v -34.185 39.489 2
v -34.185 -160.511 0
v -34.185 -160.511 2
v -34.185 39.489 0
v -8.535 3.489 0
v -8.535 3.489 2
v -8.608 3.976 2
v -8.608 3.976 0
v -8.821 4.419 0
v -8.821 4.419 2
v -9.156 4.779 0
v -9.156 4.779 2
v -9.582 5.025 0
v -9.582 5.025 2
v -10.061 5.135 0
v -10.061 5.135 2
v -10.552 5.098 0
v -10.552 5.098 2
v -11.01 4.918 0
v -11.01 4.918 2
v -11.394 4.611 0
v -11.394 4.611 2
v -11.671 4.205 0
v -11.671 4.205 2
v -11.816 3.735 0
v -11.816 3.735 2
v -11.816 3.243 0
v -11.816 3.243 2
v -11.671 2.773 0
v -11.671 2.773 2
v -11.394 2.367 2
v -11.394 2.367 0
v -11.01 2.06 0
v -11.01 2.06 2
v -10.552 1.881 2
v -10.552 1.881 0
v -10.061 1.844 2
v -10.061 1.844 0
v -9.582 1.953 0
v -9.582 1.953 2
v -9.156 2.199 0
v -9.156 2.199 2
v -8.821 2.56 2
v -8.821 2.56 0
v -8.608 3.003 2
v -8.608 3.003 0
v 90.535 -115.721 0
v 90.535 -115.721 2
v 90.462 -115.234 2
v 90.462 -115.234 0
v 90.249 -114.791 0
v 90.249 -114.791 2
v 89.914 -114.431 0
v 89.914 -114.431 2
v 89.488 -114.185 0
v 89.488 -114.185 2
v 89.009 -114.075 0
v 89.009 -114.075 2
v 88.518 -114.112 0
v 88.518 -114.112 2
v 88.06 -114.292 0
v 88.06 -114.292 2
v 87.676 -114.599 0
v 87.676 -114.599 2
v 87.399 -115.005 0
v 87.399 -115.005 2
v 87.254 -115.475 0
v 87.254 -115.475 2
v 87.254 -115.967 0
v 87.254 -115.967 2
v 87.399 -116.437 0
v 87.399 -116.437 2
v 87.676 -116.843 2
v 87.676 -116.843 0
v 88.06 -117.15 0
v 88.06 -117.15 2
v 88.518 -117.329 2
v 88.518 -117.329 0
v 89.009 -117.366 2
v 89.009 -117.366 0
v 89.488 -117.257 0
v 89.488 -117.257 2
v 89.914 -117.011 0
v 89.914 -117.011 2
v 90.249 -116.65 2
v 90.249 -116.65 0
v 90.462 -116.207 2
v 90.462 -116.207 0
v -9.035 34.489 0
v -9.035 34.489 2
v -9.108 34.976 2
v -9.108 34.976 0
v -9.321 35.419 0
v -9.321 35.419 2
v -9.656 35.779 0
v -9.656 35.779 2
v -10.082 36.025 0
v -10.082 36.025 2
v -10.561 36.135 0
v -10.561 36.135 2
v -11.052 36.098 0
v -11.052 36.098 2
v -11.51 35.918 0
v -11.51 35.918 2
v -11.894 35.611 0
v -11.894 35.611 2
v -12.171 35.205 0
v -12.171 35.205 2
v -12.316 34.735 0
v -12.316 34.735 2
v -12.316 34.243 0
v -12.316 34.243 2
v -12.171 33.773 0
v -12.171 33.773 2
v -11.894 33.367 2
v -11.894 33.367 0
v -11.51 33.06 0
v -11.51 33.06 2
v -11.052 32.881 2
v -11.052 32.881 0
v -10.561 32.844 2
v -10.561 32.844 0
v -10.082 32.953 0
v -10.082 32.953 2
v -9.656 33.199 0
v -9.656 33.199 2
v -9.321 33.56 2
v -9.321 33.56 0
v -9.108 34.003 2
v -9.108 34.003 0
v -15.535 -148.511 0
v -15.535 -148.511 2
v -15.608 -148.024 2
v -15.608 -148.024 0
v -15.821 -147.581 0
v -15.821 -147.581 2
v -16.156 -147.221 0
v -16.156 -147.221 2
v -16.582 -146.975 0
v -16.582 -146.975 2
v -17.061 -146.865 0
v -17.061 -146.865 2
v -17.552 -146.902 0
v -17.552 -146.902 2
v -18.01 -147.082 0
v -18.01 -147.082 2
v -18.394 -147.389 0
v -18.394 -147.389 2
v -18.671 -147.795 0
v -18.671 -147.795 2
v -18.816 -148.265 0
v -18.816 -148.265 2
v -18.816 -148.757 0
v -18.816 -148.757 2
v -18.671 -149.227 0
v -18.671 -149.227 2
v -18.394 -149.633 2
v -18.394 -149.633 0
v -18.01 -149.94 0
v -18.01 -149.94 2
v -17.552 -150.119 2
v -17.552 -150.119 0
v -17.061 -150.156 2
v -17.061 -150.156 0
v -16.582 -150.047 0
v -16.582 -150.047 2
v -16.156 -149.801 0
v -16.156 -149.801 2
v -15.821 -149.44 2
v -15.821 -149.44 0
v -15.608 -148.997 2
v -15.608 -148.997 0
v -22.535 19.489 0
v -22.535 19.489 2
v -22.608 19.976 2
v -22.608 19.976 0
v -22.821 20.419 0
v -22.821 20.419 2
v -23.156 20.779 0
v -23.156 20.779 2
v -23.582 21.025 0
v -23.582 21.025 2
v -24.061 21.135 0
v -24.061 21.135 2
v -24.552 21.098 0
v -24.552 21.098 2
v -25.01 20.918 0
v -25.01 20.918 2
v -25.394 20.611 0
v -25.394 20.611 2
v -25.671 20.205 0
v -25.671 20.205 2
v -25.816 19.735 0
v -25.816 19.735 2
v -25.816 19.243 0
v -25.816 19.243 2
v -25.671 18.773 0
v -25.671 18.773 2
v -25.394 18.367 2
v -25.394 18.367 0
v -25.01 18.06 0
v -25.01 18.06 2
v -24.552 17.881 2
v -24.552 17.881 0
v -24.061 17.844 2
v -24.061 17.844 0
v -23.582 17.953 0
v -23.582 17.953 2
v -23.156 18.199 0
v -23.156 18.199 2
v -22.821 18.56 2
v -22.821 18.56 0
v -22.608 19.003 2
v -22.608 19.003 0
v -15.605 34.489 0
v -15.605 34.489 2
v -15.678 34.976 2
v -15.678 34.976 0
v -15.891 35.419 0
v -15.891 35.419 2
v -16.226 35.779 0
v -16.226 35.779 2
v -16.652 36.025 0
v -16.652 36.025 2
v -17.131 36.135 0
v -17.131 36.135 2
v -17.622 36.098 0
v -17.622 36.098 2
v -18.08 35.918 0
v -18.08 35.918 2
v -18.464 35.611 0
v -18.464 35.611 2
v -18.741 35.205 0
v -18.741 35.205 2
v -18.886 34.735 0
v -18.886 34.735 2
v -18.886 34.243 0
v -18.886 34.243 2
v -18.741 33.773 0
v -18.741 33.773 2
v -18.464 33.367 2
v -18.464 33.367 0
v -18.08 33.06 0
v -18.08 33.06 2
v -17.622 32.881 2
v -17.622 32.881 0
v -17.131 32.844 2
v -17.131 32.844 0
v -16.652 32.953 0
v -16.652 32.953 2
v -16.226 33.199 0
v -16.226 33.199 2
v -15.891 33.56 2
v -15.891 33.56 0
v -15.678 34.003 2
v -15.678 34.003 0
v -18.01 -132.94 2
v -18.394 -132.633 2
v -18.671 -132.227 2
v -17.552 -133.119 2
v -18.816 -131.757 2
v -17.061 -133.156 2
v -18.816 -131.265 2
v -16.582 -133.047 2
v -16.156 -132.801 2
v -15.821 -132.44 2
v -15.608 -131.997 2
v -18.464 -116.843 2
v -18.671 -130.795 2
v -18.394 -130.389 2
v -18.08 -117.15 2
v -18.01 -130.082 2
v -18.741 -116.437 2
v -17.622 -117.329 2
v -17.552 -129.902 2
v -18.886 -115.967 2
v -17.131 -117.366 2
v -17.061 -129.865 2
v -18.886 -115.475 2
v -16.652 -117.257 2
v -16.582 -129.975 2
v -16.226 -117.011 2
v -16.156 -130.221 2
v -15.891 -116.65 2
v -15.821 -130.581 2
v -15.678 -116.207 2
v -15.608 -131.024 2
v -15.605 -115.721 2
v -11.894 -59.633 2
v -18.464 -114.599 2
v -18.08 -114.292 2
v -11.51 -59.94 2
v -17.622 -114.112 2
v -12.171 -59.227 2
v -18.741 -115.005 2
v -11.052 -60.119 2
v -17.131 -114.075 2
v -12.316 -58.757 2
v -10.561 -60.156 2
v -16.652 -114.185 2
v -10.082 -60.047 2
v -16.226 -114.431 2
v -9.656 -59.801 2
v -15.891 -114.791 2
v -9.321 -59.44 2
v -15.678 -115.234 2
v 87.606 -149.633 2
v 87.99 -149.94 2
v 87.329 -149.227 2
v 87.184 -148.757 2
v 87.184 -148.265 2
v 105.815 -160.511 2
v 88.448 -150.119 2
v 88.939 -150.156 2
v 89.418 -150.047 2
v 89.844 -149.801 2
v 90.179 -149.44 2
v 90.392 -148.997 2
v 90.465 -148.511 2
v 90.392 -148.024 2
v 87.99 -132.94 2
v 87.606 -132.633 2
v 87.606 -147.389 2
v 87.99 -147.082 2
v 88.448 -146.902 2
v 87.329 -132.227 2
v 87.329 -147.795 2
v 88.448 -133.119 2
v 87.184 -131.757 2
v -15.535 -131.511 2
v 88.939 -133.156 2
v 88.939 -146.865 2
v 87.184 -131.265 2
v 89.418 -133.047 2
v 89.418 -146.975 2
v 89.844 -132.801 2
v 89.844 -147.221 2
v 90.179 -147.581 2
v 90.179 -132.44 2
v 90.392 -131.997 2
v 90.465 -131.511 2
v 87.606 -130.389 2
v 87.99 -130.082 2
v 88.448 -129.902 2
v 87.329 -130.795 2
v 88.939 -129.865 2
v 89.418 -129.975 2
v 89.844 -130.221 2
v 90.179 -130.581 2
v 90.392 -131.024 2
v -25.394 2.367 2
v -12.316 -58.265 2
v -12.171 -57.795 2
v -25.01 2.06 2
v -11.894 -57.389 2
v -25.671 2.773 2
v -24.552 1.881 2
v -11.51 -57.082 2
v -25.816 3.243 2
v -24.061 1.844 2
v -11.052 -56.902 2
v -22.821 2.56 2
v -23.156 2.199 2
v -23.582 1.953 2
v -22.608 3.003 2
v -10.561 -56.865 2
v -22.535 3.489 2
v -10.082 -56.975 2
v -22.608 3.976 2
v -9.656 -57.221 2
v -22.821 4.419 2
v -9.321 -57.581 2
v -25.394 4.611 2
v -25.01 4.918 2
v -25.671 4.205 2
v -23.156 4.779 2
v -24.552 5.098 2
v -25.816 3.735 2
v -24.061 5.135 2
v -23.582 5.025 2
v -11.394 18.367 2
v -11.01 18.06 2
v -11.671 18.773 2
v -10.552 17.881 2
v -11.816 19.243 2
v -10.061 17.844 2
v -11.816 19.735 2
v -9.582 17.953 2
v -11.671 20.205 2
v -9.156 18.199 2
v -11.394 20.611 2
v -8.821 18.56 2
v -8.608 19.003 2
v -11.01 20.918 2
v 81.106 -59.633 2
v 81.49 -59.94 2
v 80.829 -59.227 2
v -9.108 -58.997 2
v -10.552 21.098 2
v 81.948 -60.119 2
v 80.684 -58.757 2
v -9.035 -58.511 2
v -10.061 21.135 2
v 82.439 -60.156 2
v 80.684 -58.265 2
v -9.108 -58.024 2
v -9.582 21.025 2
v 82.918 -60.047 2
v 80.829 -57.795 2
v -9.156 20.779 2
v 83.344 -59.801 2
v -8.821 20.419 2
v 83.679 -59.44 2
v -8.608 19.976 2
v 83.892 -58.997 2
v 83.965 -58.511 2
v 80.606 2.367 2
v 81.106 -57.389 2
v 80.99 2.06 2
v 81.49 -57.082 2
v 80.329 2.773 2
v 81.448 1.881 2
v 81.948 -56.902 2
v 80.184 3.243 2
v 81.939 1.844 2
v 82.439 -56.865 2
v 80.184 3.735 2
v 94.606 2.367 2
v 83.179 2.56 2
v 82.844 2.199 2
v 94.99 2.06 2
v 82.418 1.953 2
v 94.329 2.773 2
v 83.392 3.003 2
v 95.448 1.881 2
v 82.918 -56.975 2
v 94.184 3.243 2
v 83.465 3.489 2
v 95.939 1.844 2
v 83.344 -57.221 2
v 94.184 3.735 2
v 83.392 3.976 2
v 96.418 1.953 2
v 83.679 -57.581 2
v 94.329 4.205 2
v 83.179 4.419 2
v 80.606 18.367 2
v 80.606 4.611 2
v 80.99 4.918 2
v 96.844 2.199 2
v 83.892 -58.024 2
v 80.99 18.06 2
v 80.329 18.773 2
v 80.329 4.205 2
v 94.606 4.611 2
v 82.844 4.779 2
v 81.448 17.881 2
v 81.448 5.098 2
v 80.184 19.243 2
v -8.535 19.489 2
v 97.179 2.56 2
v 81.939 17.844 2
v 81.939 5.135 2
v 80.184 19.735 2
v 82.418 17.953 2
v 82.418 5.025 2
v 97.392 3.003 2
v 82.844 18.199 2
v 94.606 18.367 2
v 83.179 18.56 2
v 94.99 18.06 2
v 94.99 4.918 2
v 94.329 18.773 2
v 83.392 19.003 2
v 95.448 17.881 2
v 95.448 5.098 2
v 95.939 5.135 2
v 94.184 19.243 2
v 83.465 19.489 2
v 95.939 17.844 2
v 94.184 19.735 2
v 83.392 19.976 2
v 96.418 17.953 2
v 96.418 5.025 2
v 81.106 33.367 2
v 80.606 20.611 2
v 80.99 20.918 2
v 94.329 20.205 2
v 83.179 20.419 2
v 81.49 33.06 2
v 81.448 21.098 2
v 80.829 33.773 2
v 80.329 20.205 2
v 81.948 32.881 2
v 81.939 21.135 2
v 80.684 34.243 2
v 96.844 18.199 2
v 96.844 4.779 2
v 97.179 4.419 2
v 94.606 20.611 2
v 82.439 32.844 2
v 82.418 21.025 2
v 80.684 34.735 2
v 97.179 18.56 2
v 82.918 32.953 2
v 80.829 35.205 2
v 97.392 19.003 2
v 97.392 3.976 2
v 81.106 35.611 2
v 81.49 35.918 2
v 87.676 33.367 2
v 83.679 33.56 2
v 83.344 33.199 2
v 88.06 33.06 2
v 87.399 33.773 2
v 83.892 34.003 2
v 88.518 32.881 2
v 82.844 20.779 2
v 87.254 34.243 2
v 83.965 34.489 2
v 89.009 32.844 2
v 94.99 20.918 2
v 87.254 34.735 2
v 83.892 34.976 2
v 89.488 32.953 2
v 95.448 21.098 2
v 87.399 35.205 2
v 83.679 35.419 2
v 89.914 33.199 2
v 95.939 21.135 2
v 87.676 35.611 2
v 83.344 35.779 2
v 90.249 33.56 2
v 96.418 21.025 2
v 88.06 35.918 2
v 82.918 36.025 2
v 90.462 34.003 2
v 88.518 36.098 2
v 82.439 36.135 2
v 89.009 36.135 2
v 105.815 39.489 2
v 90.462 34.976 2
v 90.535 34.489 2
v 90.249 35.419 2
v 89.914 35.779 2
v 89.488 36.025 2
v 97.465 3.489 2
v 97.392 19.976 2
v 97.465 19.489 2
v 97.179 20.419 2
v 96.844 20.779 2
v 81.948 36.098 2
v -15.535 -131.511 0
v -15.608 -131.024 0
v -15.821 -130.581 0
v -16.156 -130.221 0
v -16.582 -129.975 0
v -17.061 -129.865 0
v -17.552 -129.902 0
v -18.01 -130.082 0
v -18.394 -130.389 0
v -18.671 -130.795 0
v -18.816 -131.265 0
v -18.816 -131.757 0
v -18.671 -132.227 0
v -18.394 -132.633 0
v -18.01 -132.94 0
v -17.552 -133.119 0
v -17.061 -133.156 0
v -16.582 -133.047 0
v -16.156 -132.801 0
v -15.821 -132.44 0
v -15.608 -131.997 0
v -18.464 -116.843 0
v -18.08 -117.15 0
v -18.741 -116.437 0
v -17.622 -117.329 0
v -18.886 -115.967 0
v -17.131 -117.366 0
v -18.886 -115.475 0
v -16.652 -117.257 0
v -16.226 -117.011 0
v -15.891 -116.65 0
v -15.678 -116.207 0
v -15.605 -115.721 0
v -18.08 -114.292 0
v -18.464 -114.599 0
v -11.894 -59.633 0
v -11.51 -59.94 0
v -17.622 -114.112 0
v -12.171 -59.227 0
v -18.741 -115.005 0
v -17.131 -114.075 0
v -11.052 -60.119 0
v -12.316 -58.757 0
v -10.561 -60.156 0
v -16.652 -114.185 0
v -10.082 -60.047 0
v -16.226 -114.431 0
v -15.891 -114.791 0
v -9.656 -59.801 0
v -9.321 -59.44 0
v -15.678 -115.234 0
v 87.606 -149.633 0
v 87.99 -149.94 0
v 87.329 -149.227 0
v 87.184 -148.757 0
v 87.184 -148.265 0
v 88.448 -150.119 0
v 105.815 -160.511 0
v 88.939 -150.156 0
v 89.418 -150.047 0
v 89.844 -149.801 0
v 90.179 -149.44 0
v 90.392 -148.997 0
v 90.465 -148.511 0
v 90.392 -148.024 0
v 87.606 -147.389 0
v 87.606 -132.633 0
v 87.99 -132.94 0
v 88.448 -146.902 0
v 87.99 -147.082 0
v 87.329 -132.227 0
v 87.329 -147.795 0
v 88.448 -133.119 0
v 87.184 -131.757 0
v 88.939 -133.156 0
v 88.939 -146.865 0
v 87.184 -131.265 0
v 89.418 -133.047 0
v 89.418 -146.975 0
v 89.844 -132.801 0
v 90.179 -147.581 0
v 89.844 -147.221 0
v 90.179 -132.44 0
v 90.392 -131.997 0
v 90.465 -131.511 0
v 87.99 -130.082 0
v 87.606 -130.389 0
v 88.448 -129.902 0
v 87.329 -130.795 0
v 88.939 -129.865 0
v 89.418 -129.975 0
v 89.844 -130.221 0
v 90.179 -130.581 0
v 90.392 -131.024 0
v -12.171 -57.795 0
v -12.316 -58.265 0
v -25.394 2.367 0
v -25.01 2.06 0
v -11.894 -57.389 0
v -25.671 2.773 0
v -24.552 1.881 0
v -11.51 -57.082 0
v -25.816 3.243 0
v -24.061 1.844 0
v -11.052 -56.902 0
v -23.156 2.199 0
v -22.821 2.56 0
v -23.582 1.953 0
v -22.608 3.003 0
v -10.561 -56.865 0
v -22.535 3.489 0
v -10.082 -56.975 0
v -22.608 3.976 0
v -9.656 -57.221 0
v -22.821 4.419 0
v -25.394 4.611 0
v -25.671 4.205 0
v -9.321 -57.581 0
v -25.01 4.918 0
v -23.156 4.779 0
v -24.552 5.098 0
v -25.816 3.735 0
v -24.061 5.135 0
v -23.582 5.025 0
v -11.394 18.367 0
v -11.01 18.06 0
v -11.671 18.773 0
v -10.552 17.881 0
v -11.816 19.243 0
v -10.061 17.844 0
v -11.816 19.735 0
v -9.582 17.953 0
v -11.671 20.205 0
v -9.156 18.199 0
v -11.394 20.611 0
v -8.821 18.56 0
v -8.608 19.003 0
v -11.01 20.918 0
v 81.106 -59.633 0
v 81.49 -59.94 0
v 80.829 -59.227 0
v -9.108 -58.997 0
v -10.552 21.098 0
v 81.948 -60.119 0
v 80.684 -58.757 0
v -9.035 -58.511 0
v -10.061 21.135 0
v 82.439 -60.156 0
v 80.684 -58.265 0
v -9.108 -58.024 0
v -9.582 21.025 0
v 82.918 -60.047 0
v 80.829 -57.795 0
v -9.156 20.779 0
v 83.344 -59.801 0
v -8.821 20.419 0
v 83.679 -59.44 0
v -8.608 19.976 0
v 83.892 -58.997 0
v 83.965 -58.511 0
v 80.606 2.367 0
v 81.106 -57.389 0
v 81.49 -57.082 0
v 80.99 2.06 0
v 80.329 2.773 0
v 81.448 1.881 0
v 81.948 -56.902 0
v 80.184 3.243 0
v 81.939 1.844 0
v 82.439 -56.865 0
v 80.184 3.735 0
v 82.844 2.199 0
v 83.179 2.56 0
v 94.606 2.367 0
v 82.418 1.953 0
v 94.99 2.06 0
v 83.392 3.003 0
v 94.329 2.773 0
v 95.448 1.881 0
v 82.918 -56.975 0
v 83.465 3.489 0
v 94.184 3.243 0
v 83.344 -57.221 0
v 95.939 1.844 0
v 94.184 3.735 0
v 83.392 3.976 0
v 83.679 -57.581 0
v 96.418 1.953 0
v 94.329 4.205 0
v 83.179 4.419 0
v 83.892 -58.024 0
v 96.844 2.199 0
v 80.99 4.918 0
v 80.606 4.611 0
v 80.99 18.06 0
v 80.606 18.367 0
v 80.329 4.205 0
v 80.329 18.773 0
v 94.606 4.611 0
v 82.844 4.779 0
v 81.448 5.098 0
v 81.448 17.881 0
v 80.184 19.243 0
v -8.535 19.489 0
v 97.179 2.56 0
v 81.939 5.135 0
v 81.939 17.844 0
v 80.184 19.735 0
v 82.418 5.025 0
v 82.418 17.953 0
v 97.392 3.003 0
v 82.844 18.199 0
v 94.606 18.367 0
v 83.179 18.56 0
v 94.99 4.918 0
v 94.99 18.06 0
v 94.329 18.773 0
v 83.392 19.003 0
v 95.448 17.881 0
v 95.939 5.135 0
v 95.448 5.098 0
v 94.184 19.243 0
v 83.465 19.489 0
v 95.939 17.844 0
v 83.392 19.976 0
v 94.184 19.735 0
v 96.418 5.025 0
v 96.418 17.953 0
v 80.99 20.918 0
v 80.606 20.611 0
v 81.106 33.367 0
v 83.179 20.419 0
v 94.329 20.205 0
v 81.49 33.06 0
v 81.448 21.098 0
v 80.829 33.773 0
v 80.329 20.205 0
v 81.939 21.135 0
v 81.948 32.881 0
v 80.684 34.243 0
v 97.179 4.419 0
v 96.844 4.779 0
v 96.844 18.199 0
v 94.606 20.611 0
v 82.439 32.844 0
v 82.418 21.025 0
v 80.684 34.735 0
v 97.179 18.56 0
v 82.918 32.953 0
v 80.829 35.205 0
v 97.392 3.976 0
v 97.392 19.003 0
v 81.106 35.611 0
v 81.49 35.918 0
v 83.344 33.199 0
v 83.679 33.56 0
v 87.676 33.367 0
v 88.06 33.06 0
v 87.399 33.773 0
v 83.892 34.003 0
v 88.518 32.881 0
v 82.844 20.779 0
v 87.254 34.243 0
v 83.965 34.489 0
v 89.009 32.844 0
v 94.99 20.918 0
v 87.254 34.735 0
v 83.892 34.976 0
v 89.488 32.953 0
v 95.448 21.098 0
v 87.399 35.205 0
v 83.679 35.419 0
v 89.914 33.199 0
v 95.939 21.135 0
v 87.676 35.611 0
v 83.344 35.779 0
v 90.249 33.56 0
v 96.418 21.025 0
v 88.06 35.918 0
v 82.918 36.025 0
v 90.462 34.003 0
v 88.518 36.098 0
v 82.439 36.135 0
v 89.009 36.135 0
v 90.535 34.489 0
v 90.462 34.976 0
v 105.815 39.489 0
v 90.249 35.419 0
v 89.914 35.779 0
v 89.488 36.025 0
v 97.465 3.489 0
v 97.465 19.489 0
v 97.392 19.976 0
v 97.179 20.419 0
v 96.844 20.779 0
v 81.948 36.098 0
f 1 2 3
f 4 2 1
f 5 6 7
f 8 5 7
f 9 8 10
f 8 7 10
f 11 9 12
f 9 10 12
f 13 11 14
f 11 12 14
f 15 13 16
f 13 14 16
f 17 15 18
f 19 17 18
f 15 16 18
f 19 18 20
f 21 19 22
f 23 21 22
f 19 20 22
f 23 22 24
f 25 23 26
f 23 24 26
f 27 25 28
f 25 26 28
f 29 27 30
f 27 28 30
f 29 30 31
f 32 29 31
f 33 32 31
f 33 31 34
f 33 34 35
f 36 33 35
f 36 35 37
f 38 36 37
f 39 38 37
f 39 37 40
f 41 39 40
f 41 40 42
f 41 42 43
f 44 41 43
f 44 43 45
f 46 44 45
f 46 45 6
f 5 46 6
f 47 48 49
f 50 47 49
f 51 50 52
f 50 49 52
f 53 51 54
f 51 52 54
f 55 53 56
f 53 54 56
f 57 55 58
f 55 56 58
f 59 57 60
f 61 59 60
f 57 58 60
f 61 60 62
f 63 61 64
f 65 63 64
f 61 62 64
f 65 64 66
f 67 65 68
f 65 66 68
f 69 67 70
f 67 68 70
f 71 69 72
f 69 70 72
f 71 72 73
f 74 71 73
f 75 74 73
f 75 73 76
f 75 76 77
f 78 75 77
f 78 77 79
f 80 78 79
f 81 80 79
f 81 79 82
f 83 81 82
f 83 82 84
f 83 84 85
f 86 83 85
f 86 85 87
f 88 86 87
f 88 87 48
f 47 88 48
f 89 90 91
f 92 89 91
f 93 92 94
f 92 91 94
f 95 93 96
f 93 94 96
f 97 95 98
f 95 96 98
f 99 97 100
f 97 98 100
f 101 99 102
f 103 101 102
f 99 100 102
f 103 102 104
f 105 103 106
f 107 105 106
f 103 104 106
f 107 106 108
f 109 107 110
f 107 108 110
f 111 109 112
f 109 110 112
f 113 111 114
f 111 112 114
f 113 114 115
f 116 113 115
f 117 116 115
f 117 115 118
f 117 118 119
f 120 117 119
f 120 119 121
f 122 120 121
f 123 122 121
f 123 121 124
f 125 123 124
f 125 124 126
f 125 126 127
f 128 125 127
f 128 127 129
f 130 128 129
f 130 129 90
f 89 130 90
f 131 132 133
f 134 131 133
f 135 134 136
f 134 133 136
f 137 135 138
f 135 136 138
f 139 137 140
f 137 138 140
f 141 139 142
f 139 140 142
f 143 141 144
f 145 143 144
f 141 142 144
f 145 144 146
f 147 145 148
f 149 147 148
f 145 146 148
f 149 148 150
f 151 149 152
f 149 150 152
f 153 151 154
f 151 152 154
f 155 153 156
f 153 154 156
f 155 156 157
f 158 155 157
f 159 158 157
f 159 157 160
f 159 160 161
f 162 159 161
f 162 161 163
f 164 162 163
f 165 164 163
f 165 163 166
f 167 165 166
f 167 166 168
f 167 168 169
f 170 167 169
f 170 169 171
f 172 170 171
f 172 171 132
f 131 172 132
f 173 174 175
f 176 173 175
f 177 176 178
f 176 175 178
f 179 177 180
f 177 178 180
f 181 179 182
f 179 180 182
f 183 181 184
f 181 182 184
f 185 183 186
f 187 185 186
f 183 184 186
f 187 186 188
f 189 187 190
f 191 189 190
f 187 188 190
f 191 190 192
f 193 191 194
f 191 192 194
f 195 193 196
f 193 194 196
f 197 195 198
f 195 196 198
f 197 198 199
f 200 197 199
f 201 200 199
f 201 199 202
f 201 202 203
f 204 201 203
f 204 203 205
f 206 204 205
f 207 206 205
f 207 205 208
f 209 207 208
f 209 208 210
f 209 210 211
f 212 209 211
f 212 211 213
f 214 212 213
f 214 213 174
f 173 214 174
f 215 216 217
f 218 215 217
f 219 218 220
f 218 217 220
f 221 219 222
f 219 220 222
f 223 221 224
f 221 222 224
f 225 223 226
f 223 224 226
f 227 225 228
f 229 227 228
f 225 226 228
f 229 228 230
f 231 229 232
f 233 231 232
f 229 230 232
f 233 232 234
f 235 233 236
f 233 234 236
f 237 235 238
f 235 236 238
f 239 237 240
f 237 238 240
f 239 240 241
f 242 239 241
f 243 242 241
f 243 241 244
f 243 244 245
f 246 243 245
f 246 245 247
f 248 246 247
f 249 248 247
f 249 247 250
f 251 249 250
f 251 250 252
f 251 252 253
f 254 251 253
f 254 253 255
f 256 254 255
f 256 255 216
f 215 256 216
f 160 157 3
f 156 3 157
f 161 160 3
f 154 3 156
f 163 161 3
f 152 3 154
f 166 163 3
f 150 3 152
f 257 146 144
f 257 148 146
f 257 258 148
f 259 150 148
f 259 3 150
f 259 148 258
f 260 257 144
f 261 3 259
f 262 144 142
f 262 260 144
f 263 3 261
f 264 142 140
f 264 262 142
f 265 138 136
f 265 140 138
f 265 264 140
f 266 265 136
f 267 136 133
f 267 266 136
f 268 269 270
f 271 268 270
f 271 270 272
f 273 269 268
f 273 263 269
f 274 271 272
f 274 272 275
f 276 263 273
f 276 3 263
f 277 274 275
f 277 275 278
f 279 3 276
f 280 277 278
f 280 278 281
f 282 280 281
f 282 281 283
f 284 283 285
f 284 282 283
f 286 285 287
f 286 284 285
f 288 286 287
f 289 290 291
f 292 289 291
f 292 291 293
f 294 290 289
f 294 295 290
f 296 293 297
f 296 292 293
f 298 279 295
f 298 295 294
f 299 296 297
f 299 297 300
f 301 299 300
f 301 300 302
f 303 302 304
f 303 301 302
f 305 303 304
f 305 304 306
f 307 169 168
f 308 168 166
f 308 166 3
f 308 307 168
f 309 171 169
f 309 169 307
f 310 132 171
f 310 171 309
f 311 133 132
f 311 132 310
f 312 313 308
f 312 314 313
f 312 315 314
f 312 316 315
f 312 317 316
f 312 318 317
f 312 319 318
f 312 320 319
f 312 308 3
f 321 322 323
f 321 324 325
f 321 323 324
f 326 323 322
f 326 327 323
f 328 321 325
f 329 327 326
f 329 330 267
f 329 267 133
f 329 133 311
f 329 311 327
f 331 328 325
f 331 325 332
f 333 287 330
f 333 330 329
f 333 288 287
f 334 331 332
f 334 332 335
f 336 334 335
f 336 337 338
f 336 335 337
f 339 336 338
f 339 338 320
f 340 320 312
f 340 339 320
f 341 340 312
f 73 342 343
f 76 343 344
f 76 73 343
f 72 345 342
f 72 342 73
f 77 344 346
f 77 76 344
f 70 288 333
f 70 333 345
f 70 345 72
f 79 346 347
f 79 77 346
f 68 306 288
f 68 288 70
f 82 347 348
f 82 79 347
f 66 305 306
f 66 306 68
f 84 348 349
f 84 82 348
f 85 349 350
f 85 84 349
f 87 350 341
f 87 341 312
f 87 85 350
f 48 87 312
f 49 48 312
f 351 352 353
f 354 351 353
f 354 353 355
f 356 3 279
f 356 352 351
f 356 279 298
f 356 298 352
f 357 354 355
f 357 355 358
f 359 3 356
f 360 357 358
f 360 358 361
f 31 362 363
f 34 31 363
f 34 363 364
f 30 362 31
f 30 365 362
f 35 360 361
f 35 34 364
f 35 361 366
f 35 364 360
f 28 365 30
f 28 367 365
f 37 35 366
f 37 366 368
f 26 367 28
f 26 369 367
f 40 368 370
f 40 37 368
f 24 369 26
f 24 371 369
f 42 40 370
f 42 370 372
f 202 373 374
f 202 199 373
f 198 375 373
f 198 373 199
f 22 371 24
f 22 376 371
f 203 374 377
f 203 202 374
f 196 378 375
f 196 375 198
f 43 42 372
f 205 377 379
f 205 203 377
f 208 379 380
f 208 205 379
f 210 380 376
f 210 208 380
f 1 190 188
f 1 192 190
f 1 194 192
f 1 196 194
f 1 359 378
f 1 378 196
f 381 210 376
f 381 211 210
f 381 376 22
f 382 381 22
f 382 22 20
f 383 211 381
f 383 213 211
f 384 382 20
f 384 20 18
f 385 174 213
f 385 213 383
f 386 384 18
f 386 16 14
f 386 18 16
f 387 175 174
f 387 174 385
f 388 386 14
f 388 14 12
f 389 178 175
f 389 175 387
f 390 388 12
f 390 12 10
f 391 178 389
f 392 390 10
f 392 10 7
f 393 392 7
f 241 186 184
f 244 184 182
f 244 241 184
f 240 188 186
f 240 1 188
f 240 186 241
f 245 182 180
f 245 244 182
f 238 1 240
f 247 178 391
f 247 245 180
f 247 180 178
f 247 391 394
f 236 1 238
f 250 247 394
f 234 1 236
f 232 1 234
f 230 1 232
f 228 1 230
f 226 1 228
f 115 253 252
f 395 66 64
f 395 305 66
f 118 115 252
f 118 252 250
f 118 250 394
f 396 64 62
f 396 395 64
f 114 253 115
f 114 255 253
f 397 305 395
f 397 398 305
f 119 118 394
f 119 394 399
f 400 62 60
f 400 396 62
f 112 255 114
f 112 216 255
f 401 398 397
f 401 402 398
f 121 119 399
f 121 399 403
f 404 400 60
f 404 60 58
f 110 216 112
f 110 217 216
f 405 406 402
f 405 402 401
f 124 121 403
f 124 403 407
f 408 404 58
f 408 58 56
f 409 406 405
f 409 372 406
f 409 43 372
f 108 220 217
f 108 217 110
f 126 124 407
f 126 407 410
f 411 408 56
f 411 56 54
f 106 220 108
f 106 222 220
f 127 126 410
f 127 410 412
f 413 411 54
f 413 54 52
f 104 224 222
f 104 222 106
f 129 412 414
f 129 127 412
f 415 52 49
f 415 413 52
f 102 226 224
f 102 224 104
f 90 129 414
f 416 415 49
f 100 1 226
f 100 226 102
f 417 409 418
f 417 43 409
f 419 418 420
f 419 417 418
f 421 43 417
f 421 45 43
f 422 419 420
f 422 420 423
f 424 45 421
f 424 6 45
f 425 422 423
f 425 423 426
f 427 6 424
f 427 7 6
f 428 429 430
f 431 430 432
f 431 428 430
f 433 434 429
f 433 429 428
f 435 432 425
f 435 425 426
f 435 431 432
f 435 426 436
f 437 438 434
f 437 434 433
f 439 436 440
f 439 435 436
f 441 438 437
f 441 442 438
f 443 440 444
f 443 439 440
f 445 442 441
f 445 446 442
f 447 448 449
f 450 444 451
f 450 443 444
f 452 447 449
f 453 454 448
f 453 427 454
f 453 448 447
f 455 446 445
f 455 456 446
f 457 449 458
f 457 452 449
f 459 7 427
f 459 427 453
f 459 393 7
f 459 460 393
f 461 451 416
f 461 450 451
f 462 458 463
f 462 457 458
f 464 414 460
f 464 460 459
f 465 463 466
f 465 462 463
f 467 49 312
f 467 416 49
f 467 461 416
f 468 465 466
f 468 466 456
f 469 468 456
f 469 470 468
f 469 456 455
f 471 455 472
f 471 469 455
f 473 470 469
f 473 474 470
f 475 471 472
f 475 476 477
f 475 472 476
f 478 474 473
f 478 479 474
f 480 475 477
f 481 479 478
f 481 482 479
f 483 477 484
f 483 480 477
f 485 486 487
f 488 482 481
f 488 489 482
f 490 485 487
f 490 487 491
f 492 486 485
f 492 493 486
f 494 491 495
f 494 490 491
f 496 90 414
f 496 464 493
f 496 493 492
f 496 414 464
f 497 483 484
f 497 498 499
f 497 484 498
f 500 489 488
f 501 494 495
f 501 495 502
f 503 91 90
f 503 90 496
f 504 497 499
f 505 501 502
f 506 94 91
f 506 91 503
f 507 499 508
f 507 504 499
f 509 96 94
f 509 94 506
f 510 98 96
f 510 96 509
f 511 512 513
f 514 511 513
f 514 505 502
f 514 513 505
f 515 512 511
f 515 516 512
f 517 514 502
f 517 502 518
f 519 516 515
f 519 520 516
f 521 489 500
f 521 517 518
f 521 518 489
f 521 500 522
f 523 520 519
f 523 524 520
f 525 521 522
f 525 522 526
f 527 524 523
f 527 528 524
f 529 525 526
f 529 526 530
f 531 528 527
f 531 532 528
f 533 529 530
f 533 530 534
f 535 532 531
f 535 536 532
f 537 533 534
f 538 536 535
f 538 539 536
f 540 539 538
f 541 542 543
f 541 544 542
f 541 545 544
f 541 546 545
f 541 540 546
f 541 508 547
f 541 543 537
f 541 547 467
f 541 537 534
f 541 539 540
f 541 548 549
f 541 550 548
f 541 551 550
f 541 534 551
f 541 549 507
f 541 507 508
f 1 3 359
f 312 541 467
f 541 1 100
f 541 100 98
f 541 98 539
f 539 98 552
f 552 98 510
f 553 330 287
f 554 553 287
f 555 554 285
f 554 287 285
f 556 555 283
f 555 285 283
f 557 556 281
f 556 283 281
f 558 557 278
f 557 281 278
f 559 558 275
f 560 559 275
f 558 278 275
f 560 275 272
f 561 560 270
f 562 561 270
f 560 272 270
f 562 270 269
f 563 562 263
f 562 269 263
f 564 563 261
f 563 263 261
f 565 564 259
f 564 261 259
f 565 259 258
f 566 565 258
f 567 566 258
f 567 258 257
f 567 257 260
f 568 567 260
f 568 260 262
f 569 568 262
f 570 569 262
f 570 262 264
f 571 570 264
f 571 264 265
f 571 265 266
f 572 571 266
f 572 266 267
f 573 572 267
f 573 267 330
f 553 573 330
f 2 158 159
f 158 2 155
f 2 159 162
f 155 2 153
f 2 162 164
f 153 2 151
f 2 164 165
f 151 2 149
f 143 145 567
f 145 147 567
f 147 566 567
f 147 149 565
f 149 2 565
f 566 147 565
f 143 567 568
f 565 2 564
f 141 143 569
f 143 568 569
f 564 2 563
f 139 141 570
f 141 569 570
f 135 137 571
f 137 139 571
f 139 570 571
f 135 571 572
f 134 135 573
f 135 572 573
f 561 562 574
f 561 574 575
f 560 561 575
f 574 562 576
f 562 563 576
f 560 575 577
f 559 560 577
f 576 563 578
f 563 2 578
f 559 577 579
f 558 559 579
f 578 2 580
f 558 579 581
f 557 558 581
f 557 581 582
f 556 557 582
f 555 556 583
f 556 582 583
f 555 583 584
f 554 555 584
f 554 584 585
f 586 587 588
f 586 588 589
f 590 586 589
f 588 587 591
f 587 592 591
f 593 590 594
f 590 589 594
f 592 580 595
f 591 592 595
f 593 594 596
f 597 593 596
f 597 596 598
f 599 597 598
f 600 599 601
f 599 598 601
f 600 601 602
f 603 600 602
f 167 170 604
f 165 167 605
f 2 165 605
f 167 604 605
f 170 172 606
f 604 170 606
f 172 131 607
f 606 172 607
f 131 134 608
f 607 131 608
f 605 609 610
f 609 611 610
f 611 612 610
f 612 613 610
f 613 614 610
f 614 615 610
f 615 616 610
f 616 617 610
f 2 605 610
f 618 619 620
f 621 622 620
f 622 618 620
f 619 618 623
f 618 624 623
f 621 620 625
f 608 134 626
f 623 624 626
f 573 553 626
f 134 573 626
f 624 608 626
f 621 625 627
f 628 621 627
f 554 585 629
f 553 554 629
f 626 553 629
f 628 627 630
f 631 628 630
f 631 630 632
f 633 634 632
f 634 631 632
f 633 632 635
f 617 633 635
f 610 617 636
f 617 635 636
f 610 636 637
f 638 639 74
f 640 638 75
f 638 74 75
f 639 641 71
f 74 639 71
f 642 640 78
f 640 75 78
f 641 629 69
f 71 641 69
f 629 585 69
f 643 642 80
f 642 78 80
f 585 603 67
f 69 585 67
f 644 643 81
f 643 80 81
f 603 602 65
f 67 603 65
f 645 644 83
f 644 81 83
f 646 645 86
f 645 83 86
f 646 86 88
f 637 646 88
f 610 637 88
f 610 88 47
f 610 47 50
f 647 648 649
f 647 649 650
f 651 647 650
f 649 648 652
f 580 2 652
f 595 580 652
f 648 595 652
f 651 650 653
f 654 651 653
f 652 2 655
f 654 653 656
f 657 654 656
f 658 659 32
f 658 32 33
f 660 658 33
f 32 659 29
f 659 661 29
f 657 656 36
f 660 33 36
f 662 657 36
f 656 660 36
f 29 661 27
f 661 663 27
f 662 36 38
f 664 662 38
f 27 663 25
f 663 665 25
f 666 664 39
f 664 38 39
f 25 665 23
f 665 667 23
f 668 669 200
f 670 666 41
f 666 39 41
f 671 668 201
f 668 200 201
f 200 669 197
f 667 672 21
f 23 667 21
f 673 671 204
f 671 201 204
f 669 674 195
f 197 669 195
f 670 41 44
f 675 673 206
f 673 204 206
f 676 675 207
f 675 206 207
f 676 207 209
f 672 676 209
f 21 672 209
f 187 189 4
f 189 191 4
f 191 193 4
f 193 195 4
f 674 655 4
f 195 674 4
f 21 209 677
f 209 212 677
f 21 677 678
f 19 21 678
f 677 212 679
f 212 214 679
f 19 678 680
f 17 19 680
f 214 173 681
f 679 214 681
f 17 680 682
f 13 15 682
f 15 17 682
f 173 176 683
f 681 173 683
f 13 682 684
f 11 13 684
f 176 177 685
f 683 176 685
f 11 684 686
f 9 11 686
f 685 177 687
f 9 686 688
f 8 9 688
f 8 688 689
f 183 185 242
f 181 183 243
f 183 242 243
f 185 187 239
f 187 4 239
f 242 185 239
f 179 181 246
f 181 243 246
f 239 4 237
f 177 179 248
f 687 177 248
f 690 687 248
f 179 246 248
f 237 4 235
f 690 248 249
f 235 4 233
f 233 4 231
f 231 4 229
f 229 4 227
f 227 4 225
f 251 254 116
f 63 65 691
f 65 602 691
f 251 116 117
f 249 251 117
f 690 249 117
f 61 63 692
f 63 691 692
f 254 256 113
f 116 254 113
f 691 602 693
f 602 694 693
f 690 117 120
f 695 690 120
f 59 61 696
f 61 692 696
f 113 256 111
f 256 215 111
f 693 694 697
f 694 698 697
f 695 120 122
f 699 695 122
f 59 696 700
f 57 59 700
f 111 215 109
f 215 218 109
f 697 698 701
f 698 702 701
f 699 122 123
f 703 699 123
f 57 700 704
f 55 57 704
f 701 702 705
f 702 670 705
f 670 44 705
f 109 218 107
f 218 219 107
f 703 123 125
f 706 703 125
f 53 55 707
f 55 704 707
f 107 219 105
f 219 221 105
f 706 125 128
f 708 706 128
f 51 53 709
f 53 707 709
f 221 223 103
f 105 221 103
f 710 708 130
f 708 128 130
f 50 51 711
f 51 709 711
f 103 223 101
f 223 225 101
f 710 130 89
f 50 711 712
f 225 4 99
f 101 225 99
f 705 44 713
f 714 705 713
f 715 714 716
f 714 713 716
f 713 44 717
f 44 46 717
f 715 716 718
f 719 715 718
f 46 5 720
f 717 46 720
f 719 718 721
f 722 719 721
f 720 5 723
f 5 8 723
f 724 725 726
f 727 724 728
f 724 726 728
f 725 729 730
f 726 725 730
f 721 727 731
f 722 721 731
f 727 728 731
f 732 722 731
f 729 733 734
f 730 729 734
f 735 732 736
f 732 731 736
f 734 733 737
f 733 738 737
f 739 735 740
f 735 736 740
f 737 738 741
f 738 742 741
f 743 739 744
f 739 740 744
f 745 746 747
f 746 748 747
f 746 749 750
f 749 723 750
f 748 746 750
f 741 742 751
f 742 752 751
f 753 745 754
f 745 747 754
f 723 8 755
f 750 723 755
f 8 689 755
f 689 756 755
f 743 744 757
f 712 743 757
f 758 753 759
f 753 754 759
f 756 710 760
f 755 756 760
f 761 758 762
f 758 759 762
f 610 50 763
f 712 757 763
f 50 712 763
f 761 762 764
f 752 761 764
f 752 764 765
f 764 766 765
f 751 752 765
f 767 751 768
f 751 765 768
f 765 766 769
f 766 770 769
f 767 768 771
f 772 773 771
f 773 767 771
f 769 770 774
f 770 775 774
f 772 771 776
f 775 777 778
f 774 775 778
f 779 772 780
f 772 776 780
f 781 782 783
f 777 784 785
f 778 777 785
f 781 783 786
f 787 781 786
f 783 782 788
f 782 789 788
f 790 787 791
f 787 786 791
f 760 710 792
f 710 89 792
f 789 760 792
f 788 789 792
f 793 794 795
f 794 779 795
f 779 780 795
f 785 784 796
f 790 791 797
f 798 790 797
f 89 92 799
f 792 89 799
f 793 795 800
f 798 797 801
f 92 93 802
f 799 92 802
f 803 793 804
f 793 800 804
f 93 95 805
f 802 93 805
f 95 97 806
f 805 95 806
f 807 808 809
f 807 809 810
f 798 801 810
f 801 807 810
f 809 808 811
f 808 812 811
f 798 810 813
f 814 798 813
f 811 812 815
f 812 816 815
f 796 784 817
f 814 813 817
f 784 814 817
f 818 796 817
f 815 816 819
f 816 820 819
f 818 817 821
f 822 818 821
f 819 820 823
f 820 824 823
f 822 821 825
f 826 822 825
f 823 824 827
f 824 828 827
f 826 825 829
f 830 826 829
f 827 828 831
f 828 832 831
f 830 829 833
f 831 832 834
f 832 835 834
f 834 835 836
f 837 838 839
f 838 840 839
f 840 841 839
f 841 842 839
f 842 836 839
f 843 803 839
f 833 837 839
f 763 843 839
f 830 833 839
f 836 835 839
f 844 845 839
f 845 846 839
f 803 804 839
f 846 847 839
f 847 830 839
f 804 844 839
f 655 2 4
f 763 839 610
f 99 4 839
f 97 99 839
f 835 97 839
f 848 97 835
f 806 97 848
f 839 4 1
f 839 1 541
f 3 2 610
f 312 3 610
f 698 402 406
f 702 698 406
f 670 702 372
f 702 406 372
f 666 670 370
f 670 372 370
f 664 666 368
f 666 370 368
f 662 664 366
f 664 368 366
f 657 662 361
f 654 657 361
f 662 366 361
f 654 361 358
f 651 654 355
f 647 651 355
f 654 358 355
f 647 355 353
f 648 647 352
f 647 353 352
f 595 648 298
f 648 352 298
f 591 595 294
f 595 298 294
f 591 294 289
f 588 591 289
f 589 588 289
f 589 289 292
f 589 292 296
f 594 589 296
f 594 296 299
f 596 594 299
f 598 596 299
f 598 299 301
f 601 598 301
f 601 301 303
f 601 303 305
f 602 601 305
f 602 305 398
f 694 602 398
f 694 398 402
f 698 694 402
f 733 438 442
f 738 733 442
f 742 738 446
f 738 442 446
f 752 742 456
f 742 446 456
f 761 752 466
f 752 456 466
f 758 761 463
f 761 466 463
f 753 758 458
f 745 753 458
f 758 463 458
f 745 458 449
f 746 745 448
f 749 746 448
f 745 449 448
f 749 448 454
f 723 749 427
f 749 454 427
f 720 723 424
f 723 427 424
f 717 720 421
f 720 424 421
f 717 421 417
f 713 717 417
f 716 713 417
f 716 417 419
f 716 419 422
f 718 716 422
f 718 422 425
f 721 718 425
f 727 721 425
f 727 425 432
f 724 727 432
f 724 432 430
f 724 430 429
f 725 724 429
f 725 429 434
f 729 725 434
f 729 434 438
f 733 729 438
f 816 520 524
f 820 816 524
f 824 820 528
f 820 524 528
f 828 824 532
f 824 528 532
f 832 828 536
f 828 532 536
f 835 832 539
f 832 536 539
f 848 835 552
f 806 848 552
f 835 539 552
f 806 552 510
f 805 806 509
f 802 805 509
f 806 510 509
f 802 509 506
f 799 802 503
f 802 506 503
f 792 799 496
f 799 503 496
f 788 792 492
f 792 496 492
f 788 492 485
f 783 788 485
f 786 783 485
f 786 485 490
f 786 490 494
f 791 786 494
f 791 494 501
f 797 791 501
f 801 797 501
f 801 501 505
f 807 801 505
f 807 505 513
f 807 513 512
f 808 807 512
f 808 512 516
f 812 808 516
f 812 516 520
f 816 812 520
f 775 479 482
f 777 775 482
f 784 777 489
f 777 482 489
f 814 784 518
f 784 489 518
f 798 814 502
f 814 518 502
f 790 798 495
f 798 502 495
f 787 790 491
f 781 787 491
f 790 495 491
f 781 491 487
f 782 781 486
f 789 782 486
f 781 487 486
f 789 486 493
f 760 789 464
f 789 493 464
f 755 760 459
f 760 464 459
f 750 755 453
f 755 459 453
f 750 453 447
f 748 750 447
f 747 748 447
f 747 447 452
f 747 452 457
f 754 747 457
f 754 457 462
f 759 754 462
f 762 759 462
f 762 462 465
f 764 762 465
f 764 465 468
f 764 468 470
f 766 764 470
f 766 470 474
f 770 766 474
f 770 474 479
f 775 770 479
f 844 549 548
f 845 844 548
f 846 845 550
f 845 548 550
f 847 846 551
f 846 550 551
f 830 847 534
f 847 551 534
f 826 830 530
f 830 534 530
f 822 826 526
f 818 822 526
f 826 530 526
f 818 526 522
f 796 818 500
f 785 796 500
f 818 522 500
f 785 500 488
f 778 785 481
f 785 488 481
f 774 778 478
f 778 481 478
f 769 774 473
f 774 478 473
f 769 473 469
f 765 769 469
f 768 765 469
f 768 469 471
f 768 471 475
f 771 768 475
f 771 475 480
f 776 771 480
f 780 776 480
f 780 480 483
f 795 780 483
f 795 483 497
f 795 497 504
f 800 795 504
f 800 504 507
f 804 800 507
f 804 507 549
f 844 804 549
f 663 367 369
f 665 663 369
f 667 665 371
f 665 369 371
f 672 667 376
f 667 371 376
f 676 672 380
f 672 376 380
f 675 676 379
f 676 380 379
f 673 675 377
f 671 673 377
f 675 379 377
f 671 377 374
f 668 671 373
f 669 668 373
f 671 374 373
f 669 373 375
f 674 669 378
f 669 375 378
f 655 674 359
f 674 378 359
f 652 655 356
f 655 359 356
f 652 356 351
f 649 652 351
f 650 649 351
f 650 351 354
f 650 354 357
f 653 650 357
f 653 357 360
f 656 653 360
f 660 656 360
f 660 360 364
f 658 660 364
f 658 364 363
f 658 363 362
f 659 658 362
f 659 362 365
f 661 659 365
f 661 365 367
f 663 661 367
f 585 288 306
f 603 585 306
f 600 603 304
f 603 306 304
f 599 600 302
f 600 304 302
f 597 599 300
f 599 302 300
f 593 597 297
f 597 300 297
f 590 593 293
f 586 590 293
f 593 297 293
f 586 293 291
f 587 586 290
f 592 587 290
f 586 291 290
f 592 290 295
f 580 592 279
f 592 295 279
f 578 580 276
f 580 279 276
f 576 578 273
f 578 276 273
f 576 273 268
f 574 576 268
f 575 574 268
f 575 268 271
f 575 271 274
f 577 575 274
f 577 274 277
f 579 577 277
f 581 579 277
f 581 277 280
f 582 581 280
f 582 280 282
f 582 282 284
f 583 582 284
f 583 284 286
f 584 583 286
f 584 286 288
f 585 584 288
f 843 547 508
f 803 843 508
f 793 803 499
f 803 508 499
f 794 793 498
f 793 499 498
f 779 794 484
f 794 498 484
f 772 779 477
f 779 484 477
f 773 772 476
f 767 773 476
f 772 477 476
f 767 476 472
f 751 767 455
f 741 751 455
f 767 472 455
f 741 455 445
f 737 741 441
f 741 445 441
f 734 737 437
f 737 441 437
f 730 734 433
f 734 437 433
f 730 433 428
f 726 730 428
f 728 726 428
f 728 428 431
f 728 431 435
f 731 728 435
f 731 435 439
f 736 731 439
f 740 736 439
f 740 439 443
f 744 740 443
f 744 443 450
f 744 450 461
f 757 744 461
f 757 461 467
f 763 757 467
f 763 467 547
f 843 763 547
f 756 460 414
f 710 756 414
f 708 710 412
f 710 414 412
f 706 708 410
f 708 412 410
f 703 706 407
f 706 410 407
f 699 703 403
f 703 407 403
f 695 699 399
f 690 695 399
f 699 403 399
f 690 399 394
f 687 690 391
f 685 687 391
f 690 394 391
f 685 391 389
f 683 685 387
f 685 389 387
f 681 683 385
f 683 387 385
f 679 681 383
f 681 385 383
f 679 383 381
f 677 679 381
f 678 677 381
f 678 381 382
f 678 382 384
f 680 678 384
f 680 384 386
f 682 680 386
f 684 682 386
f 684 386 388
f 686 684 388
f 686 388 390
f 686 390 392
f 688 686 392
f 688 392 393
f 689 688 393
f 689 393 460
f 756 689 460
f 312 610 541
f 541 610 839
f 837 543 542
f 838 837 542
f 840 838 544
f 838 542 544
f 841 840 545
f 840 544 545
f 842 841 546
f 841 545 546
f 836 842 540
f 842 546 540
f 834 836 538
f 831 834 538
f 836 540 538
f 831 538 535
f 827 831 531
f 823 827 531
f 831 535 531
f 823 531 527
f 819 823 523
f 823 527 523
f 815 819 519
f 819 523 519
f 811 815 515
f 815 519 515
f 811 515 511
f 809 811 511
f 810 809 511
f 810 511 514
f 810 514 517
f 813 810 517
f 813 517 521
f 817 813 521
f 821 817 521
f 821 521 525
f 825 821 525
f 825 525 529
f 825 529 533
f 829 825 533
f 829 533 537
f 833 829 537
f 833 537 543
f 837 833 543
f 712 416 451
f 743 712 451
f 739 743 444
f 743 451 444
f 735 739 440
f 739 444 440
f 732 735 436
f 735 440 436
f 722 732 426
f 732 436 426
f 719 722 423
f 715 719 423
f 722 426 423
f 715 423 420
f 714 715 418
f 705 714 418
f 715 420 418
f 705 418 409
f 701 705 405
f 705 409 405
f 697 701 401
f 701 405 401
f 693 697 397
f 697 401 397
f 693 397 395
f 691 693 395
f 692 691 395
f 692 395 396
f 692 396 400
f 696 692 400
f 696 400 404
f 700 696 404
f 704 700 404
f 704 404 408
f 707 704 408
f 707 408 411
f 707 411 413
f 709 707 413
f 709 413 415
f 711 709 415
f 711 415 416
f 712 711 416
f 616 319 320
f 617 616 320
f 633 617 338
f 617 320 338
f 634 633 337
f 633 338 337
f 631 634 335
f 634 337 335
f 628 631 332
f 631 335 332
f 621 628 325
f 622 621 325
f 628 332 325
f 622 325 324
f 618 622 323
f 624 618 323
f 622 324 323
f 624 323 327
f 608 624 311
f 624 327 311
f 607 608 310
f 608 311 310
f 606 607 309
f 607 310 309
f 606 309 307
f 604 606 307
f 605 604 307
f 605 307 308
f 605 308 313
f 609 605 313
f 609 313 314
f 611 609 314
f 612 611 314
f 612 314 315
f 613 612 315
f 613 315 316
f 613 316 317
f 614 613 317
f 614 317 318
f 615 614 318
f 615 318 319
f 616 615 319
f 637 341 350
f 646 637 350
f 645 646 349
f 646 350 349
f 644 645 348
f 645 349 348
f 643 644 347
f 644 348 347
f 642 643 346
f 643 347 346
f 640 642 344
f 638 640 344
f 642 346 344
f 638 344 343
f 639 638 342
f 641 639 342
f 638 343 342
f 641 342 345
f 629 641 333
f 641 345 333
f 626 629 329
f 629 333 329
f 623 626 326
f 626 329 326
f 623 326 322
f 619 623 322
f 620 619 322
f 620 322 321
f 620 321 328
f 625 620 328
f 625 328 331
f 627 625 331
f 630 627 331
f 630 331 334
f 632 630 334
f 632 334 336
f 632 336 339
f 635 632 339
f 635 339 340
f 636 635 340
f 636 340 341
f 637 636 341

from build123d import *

# Parameters (mm, degrees)
SKETCH_1_W          = 140
SKETCH_1_H          = 200
EXTRUDE_1_DEPTH     = 2
SKETCH_3_R          = 1.65
CUT_EXTRUDE_1_DEPTH = 5


with BuildPart() as part:
    # 草图1 → 凸台-拉伸1 (new body)
    with BuildSketch(Plane.XY):
        with Locations((35.815329949, -60.510812183)):
            Rectangle(SKETCH_1_W, SKETCH_1_H)
    extrude(amount=EXTRUDE_1_DEPTH)

    # 草图3 → 切除-拉伸1 (cut)
    with BuildSketch(Plane.XY.offset(2)):
        with Locations((-10.684670051, 34.489187817)):
            Circle(SKETCH_3_R)
        with Locations((82.315329949, 34.489187817)):
            Circle(SKETCH_3_R)
        with Locations((82.315329949, -58.510812183)):
            Circle(SKETCH_3_R)
        with Locations((-10.684670051, -58.510812183)):
            Circle(SKETCH_3_R)
        with Locations((-24.184670051, 19.489187817)):
            Circle(SKETCH_3_R)
        with Locations((-10.184670051, 19.489187817)):
            Circle(SKETCH_3_R)
        with Locations((-24.184670051, 3.489187817)):
            Circle(SKETCH_3_R)
        with Locations((-10.184670051, 3.489187817)):
            Circle(SKETCH_3_R)
        with Locations((81.815329949, 3.489187817)):
            Circle(SKETCH_3_R)
        with Locations((95.815329949, 3.489187817)):
            Circle(SKETCH_3_R)
        with Locations((81.815329949, 19.489187817)):
            Circle(SKETCH_3_R)
        with Locations((95.815329949, 19.489187817)):
            Circle(SKETCH_3_R)
        with Locations((-17.184670051, -131.510812183)):
            Circle(SKETCH_3_R)
        with Locations((-17.184670051, -148.510812183)):
            Circle(SKETCH_3_R)
        with Locations((88.815329949, -148.510812183)):
            Circle(SKETCH_3_R)
        with Locations((88.815329949, -131.510812183)):
            Circle(SKETCH_3_R)
        with Locations((-17.254670051, 34.489187817)):
            Circle(SKETCH_3_R)
        with Locations((88.885329949, 34.489187817)):
            Circle(SKETCH_3_R)
        with Locations((88.885329949, -115.720812183)):
            Circle(SKETCH_3_R)
        with Locations((-17.254670051, -115.720812183)):
            Circle(SKETCH_3_R)
    extrude(amount=-CUT_EXTRUDE_1_DEPTH, mode=Mode.SUBTRACT)


solid = part.part
